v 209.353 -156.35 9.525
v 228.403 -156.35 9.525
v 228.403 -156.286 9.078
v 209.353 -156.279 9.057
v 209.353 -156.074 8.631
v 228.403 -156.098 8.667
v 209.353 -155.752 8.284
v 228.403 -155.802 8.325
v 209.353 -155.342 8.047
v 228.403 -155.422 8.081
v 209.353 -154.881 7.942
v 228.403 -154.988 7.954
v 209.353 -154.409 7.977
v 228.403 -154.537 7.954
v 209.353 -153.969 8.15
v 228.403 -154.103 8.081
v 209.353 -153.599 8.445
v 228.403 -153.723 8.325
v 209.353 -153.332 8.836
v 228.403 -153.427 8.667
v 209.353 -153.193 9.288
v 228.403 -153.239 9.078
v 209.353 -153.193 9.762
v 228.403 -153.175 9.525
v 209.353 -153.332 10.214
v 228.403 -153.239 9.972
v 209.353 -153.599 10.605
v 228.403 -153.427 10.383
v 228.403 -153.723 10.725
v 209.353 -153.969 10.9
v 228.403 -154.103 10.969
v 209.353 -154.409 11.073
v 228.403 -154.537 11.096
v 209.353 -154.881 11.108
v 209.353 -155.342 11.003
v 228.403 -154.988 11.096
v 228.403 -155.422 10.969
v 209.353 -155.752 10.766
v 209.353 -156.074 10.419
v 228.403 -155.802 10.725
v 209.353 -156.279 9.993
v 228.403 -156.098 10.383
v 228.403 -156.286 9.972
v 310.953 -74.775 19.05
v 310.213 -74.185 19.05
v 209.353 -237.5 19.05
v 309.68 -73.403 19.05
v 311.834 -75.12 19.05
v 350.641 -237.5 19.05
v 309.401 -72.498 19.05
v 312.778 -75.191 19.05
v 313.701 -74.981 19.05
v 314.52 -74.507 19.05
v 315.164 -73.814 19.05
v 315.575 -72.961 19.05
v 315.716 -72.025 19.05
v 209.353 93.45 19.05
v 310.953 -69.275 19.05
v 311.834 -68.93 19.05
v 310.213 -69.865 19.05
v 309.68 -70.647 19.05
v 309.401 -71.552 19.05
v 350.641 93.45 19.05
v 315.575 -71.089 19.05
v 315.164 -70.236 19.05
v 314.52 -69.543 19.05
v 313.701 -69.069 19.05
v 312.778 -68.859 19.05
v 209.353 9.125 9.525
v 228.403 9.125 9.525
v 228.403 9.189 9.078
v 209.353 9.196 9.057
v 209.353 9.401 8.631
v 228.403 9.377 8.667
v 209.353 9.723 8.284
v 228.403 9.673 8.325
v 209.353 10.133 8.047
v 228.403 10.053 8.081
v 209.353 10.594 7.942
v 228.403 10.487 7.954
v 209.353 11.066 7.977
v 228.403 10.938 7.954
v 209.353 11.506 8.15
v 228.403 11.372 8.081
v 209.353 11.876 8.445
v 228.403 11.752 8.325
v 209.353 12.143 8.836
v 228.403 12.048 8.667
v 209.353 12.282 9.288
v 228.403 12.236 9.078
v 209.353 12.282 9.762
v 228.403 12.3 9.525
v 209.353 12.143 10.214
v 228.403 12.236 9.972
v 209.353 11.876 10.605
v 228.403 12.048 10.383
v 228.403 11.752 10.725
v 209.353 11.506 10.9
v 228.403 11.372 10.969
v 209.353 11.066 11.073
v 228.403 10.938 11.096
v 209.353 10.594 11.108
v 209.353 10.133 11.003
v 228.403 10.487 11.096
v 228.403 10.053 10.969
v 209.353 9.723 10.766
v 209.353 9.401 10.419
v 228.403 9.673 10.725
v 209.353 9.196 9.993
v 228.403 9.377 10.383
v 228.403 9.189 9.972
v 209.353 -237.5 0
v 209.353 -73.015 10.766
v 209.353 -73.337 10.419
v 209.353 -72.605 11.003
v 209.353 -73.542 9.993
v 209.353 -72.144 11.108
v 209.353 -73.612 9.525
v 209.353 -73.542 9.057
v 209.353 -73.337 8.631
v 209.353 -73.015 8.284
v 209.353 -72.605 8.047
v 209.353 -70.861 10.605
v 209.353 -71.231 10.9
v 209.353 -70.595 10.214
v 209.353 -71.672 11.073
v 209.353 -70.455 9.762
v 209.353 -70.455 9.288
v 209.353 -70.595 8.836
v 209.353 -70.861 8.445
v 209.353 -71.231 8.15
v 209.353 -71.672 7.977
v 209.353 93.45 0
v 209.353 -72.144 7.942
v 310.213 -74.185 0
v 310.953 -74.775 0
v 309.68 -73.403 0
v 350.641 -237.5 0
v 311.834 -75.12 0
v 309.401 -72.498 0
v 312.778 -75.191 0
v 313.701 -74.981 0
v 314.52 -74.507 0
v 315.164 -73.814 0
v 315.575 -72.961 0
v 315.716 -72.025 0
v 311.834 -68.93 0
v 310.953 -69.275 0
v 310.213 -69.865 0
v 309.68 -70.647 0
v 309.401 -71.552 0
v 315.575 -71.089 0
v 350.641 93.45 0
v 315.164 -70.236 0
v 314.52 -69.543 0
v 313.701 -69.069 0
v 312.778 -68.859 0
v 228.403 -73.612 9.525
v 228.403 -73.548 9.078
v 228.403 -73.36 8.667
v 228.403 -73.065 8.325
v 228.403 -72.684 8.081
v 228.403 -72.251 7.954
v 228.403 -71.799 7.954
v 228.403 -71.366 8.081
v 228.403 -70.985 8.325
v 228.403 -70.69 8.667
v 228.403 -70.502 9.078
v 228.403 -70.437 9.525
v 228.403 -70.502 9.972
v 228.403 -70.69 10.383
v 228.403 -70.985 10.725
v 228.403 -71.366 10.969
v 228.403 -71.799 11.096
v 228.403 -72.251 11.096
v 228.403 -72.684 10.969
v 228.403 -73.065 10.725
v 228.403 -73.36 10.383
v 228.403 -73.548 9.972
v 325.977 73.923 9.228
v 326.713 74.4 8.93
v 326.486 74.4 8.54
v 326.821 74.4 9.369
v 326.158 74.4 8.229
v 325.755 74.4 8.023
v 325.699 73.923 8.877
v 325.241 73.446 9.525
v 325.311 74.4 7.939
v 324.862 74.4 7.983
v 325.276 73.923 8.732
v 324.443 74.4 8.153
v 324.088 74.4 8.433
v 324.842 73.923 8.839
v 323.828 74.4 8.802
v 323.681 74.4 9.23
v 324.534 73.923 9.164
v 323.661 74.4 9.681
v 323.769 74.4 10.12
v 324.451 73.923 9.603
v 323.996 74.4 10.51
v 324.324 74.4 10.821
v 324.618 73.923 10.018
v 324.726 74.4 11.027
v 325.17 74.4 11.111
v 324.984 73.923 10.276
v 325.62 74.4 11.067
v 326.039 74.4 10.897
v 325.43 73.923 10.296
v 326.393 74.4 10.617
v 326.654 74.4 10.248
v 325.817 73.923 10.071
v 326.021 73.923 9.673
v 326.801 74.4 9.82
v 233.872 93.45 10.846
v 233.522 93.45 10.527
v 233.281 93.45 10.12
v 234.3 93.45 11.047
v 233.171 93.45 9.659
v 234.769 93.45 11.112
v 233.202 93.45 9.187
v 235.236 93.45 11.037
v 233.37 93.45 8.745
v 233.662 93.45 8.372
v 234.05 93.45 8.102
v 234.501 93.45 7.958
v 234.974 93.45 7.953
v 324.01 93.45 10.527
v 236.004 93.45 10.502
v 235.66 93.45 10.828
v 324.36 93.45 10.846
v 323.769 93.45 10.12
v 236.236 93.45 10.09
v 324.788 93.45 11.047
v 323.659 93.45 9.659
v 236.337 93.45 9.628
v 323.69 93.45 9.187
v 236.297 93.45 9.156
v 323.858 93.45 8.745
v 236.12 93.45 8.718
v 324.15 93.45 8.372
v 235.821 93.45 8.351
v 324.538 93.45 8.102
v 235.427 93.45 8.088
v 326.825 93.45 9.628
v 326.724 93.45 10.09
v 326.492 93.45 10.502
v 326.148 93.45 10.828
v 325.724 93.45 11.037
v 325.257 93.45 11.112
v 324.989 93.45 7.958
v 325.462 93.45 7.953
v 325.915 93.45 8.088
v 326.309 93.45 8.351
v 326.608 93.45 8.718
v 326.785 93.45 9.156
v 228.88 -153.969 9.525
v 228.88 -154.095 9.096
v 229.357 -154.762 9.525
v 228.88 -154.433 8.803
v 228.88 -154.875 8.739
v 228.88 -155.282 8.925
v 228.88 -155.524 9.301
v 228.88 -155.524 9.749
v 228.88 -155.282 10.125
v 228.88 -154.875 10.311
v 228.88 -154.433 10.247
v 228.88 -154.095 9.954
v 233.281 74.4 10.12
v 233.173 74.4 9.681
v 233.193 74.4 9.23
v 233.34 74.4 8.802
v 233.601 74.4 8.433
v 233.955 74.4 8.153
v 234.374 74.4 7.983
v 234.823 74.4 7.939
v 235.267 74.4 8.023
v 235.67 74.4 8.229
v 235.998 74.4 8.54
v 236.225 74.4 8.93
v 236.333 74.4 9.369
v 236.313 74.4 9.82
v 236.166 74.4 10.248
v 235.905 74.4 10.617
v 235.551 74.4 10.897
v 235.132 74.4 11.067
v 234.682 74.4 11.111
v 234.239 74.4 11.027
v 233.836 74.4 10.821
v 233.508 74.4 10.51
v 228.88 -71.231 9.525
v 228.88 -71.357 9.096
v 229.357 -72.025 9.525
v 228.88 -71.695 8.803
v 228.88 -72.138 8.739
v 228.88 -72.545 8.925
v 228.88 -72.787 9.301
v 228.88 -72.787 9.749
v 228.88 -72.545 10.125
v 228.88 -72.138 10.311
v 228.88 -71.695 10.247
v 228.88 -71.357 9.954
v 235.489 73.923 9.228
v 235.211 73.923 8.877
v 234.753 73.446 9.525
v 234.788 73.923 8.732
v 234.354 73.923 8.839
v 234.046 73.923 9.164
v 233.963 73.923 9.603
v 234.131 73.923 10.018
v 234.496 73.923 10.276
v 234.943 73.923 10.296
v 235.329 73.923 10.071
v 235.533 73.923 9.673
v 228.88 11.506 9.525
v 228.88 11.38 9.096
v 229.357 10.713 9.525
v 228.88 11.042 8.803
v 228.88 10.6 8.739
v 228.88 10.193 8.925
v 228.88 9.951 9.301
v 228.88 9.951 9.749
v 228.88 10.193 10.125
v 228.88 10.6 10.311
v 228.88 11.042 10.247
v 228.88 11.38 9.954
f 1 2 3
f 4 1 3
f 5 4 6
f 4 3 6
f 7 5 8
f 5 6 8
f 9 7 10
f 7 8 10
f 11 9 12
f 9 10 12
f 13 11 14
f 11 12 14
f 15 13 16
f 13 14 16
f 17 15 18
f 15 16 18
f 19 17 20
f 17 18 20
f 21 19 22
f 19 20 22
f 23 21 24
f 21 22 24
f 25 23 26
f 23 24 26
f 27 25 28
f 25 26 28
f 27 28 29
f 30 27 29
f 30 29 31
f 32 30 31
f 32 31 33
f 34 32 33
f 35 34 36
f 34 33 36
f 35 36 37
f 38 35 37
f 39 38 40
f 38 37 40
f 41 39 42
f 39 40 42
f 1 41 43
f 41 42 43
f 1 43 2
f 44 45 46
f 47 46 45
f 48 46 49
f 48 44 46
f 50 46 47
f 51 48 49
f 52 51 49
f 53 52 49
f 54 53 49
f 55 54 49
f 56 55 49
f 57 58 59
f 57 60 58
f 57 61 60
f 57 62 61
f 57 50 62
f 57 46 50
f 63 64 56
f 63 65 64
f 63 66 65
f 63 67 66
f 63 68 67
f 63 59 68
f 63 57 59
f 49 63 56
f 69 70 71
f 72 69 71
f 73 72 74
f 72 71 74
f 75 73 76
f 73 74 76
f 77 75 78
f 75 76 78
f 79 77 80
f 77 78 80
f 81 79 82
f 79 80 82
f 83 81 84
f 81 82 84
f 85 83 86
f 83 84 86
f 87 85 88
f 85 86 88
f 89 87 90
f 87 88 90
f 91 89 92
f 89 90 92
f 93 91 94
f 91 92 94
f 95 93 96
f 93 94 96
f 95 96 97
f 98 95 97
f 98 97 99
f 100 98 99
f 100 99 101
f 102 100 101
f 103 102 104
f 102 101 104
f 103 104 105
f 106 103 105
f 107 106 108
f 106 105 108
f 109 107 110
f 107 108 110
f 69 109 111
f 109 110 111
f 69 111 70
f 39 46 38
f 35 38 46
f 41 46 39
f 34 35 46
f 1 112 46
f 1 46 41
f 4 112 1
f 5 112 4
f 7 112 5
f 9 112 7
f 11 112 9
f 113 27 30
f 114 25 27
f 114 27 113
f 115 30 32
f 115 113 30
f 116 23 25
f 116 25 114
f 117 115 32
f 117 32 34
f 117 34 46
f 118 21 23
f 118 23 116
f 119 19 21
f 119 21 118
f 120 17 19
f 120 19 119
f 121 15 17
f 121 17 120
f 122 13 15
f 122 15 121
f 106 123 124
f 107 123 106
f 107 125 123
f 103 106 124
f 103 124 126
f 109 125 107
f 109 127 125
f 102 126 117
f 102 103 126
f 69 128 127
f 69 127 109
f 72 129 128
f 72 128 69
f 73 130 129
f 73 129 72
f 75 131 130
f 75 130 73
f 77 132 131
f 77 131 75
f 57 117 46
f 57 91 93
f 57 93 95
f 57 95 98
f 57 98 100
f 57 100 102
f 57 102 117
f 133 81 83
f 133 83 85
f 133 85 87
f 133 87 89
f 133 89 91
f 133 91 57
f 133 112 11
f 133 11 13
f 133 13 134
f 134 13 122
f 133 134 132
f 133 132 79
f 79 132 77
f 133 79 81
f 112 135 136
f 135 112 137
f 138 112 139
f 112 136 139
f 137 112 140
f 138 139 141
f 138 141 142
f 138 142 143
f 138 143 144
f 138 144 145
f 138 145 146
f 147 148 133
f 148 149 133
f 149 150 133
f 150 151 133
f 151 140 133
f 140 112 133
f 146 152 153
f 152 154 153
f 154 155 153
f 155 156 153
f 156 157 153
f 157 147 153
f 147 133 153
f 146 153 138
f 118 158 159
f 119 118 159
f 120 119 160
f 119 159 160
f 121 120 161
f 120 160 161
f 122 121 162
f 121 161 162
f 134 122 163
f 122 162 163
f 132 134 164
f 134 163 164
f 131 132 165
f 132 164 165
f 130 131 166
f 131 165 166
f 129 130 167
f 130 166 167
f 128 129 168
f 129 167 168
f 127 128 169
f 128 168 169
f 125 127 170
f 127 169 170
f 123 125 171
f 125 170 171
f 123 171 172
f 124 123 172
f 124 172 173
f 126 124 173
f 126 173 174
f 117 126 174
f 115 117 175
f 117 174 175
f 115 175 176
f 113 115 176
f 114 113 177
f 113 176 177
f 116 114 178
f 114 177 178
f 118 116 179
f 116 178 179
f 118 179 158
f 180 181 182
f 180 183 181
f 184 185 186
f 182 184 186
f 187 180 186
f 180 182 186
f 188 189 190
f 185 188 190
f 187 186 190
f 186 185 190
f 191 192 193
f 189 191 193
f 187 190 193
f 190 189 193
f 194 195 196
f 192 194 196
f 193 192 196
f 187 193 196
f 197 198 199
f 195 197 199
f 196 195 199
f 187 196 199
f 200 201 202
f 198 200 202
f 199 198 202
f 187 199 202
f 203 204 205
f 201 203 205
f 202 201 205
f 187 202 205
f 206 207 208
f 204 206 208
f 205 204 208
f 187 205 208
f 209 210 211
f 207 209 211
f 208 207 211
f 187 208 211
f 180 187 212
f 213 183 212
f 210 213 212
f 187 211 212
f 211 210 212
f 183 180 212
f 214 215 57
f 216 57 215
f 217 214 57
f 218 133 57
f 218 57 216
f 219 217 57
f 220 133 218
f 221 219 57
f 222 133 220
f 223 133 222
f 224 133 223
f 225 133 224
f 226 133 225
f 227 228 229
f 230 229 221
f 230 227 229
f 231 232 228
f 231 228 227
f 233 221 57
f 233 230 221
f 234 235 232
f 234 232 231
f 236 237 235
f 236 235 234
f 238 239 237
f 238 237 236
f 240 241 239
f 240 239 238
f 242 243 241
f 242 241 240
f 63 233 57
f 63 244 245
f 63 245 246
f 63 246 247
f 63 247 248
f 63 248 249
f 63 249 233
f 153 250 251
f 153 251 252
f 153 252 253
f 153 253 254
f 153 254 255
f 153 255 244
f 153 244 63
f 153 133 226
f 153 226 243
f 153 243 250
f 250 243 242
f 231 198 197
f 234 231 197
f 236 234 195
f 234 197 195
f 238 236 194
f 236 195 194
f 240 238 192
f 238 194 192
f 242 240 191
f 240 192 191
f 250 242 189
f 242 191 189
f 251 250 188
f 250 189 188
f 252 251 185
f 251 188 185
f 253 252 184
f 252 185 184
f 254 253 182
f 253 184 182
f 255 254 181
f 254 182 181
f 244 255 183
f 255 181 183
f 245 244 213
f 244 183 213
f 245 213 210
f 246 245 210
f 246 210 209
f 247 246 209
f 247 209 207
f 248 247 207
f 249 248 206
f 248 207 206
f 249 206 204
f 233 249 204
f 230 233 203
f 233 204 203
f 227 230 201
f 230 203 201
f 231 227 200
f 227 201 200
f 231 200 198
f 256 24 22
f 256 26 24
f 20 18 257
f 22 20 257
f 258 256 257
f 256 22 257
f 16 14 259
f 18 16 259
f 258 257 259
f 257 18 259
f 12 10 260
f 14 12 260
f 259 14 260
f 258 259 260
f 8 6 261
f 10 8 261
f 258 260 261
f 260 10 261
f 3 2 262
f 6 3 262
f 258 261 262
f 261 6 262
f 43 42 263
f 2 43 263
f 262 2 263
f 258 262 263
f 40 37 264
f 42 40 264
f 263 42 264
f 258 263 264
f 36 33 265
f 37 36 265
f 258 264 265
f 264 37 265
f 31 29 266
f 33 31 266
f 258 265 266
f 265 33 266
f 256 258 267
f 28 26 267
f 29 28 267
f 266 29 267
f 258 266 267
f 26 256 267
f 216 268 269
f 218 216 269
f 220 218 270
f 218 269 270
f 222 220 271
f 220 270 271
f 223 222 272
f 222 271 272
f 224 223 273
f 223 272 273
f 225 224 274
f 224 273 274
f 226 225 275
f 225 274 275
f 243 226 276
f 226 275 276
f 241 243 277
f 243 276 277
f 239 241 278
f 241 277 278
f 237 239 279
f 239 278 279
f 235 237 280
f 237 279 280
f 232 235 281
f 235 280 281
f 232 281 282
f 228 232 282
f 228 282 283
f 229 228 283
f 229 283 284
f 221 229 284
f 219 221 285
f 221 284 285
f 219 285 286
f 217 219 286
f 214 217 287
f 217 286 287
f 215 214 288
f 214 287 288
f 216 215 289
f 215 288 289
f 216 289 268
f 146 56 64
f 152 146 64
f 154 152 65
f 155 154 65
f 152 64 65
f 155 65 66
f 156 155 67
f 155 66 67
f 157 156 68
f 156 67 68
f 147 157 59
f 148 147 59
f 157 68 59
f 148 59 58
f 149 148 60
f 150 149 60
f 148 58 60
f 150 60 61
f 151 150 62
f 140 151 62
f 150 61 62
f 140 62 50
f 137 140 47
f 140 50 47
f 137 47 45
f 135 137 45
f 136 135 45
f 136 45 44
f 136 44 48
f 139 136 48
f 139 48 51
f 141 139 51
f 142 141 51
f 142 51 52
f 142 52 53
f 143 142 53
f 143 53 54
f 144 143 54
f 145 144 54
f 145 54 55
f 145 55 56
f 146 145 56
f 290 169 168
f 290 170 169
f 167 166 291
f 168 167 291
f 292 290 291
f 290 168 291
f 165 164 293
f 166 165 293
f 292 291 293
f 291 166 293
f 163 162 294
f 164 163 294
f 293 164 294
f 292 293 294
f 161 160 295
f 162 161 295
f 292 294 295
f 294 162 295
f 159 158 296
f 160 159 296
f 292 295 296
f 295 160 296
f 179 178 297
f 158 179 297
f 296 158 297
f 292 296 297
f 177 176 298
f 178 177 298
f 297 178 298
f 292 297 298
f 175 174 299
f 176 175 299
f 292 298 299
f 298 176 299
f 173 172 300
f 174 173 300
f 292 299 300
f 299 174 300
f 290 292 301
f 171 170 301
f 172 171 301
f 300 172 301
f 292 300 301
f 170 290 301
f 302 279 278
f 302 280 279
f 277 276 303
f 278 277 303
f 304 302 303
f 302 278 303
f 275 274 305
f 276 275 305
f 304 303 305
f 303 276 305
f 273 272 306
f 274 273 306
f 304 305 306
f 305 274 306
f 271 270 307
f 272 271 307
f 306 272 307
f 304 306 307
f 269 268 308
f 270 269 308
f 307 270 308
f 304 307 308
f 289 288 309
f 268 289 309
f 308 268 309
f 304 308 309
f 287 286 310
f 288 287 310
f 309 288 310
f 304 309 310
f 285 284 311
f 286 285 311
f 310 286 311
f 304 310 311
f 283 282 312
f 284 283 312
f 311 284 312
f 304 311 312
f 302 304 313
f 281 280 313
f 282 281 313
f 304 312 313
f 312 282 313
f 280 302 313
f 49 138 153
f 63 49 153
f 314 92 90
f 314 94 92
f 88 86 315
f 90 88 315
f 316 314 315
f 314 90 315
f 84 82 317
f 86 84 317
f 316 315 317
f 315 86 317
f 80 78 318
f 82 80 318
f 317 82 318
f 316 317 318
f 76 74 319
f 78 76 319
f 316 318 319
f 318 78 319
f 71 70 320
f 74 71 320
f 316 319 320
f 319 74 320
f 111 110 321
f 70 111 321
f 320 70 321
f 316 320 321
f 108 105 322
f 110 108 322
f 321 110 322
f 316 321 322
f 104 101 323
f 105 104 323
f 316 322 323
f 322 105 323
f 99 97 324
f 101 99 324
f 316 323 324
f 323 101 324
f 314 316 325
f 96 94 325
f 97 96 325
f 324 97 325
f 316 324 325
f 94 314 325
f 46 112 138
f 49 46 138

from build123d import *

# Parameters (mm, degrees)
SKETCH1_W                   = 141.287862113
SKETCH1_H                   = 330.949999988
BOSS_EXTRUDE1_DEPTH         = 19.05
HOLE1_D                     = 3.175
HOLE1_DEPTH                 = 31.75
HOLE1_CSINK_D               = 10.16
HOLE1_CSINK_ANGLE           = 82
HOLE1_TIP                   = 0.953866233
HOLE3_D                     = 3.175
HOLE3_DEPTH                 = 38.1
HOLE3_CSINK_D               = 10.16
HOLE3_CSINK_ANGLE           = 82
HOLE3_TIP                   = 0.953866233
F_1_4_0_25_DIAMETER_HOLE1_D = 6.35
HOLE4_D                     = 3.175
HOLE4_DEPTH                 = 31.75
HOLE4_CSINK_D               = 10.16
HOLE4_CSINK_ANGLE           = 82
HOLE4_TIP                   = 0.953866233
HOLE5_D                     = 3.175
HOLE5_DEPTH                 = 38.1
HOLE5_CSINK_D               = 10.16
HOLE5_CSINK_ANGLE           = 82
HOLE5_TIP                   = 0.953866233


with BuildPart() as part:
    # Sketch1 → Boss-Extrude1 (new body)
    with BuildSketch(Plane.XY):
        with Locations((279.996898238, -72.024999997)):
            Rectangle(SKETCH1_W, SKETCH1_H)
    extrude(amount=BOSS_EXTRUDE1_DEPTH)

    # Hole1
    with Locations(Plane(origin=(196.652967181, -72.024999997, 386.262770337), x_dir=(0, 1, 0), z_dir=(-1, 0, 0))):
        with Locations((174.999999994, 685.961004241), (174.999999994, 549.837259632), (174.999999994, 413.713515022), (81.549999997, 779.649723129), (81.549999997, 652.344645962), (62.499999997, 662.953402392), (62.499999997, 769.040966698), (-62.499999997, 769.040966698), (-62.499999997, 662.953402392), (-81.549999997, 652.344645962), (-81.549999997, 779.649723129), (-174.999999994, 413.713515022), (-174.999999994, 549.837259632), (-174.999999994, 685.961004241), (-82.737499997, 600.384620239), (0, 600.384620239), (82.737499997, 600.384620239), (0, 376.737770337), (-82.737499997, 376.737770337), (82.737499997, 376.737770337)):
            CounterSinkHole(HOLE1_D / 2, HOLE1_CSINK_D / 2, depth=HOLE1_DEPTH, counter_sink_angle=HOLE1_CSINK_ANGLE)
            with Locations((0, 0, -(HOLE1_DEPTH + HOLE1_TIP / 2))):  # 118° drill point
                Cone(0, HOLE1_D / 2, HOLE1_TIP, mode=Mode.SUBTRACT)

    # Hole3
    with Locations(Plane(origin=(-181.039434513, 112.499999997, 386.262770337), x_dir=(0.927183855, 0, -0.374606593), z_dir=(0, 1, 0))):
        with Locations((46.221112845, 113.488854888), (39.39759596, 37.945520226), (412.28786892, 80.423559293), (407.308516105, 25.297013484), (513.561319184, 161.164706775), (597.46020397, 127.267357003), (610.543339245, 159.649253123), (694.322923815, 367.011001477), (526.644454459, 193.546602895), (610.424039029, 400.908351249)):
            CounterSinkHole(HOLE3_D / 2, HOLE3_CSINK_D / 2, depth=HOLE3_DEPTH, counter_sink_angle=HOLE3_CSINK_ANGLE)
            with Locations((0, 0, -(HOLE3_DEPTH + HOLE3_TIP / 2))):  # 118° drill point
                Cone(0, HOLE3_D / 2, HOLE3_TIP, mode=Mode.SUBTRACT)

    # 1/4 (0.25) Diameter Hole1 (through all)
    with Locations(Plane(origin=(0, 0, 0), x_dir=(-1, 0, 0), z_dir=(0, 0, -1))):
        with Locations((-312.540829294, -72.024999997)):
            Hole(F_1_4_0_25_DIAMETER_HOLE1_D / 2)

    # Hole4
    with Locations(Plane(origin=(196.652967181, -72.024999997, 609.909620239), x_dir=(0, 1, 0), z_dir=(-1, 0, 0))):
        with Locations((174.999999994, 685.961004241), (174.999999994, 549.837259632), (174.999999994, 413.713515022), (81.549999997, 779.649723129), (81.549999997, 652.344645962), (62.499999997, 662.953402392), (62.499999997, 769.040966698), (-62.499999997, 769.040966698), (-62.499999997, 662.953402392), (-81.549999997, 652.344645962), (-81.549999997, 779.649723129), (-174.999999994, 413.713515022), (-174.999999994, 549.837259632), (-174.999999994, 685.961004241), (-82.737499997, 600.384620239), (0, 600.384620239), (82.737499997, 600.384620239), (0, 376.737770337), (-82.737499997, 376.737770337), (82.737499997, 376.737770337)):
            CounterSinkHole(HOLE4_D / 2, HOLE4_CSINK_D / 2, depth=HOLE4_DEPTH, counter_sink_angle=HOLE4_CSINK_ANGLE)
            with Locations((0, 0, -(HOLE4_DEPTH + HOLE4_TIP / 2))):  # 118° drill point
                Cone(0, HOLE4_D / 2, HOLE4_TIP, mode=Mode.SUBTRACT)

    # Hole5
    with Locations(Plane(origin=(-181.039434513, 112.499999997, 609.909620239), x_dir=(0.927183855, 0, -0.374606593), z_dir=(0, 1, 0))):
        with Locations((46.221112845, 113.488854888), (39.39759596, 37.945520226), (412.28786892, 80.423559293), (407.308516105, 25.297013484), (513.561319184, 161.164706775), (597.46020397, 127.267357003), (610.543339245, 159.649253123), (694.322923815, 367.011001477), (526.644454459, 193.546602895), (610.424039029, 400.908351249)):
            CounterSinkHole(HOLE5_D / 2, HOLE5_CSINK_D / 2, depth=HOLE5_DEPTH, counter_sink_angle=HOLE5_CSINK_ANGLE)
            with Locations((0, 0, -(HOLE5_DEPTH + HOLE5_TIP / 2))):  # 118° drill point
                Cone(0, HOLE5_D / 2, HOLE5_TIP, mode=Mode.SUBTRACT)


solid = part.part
